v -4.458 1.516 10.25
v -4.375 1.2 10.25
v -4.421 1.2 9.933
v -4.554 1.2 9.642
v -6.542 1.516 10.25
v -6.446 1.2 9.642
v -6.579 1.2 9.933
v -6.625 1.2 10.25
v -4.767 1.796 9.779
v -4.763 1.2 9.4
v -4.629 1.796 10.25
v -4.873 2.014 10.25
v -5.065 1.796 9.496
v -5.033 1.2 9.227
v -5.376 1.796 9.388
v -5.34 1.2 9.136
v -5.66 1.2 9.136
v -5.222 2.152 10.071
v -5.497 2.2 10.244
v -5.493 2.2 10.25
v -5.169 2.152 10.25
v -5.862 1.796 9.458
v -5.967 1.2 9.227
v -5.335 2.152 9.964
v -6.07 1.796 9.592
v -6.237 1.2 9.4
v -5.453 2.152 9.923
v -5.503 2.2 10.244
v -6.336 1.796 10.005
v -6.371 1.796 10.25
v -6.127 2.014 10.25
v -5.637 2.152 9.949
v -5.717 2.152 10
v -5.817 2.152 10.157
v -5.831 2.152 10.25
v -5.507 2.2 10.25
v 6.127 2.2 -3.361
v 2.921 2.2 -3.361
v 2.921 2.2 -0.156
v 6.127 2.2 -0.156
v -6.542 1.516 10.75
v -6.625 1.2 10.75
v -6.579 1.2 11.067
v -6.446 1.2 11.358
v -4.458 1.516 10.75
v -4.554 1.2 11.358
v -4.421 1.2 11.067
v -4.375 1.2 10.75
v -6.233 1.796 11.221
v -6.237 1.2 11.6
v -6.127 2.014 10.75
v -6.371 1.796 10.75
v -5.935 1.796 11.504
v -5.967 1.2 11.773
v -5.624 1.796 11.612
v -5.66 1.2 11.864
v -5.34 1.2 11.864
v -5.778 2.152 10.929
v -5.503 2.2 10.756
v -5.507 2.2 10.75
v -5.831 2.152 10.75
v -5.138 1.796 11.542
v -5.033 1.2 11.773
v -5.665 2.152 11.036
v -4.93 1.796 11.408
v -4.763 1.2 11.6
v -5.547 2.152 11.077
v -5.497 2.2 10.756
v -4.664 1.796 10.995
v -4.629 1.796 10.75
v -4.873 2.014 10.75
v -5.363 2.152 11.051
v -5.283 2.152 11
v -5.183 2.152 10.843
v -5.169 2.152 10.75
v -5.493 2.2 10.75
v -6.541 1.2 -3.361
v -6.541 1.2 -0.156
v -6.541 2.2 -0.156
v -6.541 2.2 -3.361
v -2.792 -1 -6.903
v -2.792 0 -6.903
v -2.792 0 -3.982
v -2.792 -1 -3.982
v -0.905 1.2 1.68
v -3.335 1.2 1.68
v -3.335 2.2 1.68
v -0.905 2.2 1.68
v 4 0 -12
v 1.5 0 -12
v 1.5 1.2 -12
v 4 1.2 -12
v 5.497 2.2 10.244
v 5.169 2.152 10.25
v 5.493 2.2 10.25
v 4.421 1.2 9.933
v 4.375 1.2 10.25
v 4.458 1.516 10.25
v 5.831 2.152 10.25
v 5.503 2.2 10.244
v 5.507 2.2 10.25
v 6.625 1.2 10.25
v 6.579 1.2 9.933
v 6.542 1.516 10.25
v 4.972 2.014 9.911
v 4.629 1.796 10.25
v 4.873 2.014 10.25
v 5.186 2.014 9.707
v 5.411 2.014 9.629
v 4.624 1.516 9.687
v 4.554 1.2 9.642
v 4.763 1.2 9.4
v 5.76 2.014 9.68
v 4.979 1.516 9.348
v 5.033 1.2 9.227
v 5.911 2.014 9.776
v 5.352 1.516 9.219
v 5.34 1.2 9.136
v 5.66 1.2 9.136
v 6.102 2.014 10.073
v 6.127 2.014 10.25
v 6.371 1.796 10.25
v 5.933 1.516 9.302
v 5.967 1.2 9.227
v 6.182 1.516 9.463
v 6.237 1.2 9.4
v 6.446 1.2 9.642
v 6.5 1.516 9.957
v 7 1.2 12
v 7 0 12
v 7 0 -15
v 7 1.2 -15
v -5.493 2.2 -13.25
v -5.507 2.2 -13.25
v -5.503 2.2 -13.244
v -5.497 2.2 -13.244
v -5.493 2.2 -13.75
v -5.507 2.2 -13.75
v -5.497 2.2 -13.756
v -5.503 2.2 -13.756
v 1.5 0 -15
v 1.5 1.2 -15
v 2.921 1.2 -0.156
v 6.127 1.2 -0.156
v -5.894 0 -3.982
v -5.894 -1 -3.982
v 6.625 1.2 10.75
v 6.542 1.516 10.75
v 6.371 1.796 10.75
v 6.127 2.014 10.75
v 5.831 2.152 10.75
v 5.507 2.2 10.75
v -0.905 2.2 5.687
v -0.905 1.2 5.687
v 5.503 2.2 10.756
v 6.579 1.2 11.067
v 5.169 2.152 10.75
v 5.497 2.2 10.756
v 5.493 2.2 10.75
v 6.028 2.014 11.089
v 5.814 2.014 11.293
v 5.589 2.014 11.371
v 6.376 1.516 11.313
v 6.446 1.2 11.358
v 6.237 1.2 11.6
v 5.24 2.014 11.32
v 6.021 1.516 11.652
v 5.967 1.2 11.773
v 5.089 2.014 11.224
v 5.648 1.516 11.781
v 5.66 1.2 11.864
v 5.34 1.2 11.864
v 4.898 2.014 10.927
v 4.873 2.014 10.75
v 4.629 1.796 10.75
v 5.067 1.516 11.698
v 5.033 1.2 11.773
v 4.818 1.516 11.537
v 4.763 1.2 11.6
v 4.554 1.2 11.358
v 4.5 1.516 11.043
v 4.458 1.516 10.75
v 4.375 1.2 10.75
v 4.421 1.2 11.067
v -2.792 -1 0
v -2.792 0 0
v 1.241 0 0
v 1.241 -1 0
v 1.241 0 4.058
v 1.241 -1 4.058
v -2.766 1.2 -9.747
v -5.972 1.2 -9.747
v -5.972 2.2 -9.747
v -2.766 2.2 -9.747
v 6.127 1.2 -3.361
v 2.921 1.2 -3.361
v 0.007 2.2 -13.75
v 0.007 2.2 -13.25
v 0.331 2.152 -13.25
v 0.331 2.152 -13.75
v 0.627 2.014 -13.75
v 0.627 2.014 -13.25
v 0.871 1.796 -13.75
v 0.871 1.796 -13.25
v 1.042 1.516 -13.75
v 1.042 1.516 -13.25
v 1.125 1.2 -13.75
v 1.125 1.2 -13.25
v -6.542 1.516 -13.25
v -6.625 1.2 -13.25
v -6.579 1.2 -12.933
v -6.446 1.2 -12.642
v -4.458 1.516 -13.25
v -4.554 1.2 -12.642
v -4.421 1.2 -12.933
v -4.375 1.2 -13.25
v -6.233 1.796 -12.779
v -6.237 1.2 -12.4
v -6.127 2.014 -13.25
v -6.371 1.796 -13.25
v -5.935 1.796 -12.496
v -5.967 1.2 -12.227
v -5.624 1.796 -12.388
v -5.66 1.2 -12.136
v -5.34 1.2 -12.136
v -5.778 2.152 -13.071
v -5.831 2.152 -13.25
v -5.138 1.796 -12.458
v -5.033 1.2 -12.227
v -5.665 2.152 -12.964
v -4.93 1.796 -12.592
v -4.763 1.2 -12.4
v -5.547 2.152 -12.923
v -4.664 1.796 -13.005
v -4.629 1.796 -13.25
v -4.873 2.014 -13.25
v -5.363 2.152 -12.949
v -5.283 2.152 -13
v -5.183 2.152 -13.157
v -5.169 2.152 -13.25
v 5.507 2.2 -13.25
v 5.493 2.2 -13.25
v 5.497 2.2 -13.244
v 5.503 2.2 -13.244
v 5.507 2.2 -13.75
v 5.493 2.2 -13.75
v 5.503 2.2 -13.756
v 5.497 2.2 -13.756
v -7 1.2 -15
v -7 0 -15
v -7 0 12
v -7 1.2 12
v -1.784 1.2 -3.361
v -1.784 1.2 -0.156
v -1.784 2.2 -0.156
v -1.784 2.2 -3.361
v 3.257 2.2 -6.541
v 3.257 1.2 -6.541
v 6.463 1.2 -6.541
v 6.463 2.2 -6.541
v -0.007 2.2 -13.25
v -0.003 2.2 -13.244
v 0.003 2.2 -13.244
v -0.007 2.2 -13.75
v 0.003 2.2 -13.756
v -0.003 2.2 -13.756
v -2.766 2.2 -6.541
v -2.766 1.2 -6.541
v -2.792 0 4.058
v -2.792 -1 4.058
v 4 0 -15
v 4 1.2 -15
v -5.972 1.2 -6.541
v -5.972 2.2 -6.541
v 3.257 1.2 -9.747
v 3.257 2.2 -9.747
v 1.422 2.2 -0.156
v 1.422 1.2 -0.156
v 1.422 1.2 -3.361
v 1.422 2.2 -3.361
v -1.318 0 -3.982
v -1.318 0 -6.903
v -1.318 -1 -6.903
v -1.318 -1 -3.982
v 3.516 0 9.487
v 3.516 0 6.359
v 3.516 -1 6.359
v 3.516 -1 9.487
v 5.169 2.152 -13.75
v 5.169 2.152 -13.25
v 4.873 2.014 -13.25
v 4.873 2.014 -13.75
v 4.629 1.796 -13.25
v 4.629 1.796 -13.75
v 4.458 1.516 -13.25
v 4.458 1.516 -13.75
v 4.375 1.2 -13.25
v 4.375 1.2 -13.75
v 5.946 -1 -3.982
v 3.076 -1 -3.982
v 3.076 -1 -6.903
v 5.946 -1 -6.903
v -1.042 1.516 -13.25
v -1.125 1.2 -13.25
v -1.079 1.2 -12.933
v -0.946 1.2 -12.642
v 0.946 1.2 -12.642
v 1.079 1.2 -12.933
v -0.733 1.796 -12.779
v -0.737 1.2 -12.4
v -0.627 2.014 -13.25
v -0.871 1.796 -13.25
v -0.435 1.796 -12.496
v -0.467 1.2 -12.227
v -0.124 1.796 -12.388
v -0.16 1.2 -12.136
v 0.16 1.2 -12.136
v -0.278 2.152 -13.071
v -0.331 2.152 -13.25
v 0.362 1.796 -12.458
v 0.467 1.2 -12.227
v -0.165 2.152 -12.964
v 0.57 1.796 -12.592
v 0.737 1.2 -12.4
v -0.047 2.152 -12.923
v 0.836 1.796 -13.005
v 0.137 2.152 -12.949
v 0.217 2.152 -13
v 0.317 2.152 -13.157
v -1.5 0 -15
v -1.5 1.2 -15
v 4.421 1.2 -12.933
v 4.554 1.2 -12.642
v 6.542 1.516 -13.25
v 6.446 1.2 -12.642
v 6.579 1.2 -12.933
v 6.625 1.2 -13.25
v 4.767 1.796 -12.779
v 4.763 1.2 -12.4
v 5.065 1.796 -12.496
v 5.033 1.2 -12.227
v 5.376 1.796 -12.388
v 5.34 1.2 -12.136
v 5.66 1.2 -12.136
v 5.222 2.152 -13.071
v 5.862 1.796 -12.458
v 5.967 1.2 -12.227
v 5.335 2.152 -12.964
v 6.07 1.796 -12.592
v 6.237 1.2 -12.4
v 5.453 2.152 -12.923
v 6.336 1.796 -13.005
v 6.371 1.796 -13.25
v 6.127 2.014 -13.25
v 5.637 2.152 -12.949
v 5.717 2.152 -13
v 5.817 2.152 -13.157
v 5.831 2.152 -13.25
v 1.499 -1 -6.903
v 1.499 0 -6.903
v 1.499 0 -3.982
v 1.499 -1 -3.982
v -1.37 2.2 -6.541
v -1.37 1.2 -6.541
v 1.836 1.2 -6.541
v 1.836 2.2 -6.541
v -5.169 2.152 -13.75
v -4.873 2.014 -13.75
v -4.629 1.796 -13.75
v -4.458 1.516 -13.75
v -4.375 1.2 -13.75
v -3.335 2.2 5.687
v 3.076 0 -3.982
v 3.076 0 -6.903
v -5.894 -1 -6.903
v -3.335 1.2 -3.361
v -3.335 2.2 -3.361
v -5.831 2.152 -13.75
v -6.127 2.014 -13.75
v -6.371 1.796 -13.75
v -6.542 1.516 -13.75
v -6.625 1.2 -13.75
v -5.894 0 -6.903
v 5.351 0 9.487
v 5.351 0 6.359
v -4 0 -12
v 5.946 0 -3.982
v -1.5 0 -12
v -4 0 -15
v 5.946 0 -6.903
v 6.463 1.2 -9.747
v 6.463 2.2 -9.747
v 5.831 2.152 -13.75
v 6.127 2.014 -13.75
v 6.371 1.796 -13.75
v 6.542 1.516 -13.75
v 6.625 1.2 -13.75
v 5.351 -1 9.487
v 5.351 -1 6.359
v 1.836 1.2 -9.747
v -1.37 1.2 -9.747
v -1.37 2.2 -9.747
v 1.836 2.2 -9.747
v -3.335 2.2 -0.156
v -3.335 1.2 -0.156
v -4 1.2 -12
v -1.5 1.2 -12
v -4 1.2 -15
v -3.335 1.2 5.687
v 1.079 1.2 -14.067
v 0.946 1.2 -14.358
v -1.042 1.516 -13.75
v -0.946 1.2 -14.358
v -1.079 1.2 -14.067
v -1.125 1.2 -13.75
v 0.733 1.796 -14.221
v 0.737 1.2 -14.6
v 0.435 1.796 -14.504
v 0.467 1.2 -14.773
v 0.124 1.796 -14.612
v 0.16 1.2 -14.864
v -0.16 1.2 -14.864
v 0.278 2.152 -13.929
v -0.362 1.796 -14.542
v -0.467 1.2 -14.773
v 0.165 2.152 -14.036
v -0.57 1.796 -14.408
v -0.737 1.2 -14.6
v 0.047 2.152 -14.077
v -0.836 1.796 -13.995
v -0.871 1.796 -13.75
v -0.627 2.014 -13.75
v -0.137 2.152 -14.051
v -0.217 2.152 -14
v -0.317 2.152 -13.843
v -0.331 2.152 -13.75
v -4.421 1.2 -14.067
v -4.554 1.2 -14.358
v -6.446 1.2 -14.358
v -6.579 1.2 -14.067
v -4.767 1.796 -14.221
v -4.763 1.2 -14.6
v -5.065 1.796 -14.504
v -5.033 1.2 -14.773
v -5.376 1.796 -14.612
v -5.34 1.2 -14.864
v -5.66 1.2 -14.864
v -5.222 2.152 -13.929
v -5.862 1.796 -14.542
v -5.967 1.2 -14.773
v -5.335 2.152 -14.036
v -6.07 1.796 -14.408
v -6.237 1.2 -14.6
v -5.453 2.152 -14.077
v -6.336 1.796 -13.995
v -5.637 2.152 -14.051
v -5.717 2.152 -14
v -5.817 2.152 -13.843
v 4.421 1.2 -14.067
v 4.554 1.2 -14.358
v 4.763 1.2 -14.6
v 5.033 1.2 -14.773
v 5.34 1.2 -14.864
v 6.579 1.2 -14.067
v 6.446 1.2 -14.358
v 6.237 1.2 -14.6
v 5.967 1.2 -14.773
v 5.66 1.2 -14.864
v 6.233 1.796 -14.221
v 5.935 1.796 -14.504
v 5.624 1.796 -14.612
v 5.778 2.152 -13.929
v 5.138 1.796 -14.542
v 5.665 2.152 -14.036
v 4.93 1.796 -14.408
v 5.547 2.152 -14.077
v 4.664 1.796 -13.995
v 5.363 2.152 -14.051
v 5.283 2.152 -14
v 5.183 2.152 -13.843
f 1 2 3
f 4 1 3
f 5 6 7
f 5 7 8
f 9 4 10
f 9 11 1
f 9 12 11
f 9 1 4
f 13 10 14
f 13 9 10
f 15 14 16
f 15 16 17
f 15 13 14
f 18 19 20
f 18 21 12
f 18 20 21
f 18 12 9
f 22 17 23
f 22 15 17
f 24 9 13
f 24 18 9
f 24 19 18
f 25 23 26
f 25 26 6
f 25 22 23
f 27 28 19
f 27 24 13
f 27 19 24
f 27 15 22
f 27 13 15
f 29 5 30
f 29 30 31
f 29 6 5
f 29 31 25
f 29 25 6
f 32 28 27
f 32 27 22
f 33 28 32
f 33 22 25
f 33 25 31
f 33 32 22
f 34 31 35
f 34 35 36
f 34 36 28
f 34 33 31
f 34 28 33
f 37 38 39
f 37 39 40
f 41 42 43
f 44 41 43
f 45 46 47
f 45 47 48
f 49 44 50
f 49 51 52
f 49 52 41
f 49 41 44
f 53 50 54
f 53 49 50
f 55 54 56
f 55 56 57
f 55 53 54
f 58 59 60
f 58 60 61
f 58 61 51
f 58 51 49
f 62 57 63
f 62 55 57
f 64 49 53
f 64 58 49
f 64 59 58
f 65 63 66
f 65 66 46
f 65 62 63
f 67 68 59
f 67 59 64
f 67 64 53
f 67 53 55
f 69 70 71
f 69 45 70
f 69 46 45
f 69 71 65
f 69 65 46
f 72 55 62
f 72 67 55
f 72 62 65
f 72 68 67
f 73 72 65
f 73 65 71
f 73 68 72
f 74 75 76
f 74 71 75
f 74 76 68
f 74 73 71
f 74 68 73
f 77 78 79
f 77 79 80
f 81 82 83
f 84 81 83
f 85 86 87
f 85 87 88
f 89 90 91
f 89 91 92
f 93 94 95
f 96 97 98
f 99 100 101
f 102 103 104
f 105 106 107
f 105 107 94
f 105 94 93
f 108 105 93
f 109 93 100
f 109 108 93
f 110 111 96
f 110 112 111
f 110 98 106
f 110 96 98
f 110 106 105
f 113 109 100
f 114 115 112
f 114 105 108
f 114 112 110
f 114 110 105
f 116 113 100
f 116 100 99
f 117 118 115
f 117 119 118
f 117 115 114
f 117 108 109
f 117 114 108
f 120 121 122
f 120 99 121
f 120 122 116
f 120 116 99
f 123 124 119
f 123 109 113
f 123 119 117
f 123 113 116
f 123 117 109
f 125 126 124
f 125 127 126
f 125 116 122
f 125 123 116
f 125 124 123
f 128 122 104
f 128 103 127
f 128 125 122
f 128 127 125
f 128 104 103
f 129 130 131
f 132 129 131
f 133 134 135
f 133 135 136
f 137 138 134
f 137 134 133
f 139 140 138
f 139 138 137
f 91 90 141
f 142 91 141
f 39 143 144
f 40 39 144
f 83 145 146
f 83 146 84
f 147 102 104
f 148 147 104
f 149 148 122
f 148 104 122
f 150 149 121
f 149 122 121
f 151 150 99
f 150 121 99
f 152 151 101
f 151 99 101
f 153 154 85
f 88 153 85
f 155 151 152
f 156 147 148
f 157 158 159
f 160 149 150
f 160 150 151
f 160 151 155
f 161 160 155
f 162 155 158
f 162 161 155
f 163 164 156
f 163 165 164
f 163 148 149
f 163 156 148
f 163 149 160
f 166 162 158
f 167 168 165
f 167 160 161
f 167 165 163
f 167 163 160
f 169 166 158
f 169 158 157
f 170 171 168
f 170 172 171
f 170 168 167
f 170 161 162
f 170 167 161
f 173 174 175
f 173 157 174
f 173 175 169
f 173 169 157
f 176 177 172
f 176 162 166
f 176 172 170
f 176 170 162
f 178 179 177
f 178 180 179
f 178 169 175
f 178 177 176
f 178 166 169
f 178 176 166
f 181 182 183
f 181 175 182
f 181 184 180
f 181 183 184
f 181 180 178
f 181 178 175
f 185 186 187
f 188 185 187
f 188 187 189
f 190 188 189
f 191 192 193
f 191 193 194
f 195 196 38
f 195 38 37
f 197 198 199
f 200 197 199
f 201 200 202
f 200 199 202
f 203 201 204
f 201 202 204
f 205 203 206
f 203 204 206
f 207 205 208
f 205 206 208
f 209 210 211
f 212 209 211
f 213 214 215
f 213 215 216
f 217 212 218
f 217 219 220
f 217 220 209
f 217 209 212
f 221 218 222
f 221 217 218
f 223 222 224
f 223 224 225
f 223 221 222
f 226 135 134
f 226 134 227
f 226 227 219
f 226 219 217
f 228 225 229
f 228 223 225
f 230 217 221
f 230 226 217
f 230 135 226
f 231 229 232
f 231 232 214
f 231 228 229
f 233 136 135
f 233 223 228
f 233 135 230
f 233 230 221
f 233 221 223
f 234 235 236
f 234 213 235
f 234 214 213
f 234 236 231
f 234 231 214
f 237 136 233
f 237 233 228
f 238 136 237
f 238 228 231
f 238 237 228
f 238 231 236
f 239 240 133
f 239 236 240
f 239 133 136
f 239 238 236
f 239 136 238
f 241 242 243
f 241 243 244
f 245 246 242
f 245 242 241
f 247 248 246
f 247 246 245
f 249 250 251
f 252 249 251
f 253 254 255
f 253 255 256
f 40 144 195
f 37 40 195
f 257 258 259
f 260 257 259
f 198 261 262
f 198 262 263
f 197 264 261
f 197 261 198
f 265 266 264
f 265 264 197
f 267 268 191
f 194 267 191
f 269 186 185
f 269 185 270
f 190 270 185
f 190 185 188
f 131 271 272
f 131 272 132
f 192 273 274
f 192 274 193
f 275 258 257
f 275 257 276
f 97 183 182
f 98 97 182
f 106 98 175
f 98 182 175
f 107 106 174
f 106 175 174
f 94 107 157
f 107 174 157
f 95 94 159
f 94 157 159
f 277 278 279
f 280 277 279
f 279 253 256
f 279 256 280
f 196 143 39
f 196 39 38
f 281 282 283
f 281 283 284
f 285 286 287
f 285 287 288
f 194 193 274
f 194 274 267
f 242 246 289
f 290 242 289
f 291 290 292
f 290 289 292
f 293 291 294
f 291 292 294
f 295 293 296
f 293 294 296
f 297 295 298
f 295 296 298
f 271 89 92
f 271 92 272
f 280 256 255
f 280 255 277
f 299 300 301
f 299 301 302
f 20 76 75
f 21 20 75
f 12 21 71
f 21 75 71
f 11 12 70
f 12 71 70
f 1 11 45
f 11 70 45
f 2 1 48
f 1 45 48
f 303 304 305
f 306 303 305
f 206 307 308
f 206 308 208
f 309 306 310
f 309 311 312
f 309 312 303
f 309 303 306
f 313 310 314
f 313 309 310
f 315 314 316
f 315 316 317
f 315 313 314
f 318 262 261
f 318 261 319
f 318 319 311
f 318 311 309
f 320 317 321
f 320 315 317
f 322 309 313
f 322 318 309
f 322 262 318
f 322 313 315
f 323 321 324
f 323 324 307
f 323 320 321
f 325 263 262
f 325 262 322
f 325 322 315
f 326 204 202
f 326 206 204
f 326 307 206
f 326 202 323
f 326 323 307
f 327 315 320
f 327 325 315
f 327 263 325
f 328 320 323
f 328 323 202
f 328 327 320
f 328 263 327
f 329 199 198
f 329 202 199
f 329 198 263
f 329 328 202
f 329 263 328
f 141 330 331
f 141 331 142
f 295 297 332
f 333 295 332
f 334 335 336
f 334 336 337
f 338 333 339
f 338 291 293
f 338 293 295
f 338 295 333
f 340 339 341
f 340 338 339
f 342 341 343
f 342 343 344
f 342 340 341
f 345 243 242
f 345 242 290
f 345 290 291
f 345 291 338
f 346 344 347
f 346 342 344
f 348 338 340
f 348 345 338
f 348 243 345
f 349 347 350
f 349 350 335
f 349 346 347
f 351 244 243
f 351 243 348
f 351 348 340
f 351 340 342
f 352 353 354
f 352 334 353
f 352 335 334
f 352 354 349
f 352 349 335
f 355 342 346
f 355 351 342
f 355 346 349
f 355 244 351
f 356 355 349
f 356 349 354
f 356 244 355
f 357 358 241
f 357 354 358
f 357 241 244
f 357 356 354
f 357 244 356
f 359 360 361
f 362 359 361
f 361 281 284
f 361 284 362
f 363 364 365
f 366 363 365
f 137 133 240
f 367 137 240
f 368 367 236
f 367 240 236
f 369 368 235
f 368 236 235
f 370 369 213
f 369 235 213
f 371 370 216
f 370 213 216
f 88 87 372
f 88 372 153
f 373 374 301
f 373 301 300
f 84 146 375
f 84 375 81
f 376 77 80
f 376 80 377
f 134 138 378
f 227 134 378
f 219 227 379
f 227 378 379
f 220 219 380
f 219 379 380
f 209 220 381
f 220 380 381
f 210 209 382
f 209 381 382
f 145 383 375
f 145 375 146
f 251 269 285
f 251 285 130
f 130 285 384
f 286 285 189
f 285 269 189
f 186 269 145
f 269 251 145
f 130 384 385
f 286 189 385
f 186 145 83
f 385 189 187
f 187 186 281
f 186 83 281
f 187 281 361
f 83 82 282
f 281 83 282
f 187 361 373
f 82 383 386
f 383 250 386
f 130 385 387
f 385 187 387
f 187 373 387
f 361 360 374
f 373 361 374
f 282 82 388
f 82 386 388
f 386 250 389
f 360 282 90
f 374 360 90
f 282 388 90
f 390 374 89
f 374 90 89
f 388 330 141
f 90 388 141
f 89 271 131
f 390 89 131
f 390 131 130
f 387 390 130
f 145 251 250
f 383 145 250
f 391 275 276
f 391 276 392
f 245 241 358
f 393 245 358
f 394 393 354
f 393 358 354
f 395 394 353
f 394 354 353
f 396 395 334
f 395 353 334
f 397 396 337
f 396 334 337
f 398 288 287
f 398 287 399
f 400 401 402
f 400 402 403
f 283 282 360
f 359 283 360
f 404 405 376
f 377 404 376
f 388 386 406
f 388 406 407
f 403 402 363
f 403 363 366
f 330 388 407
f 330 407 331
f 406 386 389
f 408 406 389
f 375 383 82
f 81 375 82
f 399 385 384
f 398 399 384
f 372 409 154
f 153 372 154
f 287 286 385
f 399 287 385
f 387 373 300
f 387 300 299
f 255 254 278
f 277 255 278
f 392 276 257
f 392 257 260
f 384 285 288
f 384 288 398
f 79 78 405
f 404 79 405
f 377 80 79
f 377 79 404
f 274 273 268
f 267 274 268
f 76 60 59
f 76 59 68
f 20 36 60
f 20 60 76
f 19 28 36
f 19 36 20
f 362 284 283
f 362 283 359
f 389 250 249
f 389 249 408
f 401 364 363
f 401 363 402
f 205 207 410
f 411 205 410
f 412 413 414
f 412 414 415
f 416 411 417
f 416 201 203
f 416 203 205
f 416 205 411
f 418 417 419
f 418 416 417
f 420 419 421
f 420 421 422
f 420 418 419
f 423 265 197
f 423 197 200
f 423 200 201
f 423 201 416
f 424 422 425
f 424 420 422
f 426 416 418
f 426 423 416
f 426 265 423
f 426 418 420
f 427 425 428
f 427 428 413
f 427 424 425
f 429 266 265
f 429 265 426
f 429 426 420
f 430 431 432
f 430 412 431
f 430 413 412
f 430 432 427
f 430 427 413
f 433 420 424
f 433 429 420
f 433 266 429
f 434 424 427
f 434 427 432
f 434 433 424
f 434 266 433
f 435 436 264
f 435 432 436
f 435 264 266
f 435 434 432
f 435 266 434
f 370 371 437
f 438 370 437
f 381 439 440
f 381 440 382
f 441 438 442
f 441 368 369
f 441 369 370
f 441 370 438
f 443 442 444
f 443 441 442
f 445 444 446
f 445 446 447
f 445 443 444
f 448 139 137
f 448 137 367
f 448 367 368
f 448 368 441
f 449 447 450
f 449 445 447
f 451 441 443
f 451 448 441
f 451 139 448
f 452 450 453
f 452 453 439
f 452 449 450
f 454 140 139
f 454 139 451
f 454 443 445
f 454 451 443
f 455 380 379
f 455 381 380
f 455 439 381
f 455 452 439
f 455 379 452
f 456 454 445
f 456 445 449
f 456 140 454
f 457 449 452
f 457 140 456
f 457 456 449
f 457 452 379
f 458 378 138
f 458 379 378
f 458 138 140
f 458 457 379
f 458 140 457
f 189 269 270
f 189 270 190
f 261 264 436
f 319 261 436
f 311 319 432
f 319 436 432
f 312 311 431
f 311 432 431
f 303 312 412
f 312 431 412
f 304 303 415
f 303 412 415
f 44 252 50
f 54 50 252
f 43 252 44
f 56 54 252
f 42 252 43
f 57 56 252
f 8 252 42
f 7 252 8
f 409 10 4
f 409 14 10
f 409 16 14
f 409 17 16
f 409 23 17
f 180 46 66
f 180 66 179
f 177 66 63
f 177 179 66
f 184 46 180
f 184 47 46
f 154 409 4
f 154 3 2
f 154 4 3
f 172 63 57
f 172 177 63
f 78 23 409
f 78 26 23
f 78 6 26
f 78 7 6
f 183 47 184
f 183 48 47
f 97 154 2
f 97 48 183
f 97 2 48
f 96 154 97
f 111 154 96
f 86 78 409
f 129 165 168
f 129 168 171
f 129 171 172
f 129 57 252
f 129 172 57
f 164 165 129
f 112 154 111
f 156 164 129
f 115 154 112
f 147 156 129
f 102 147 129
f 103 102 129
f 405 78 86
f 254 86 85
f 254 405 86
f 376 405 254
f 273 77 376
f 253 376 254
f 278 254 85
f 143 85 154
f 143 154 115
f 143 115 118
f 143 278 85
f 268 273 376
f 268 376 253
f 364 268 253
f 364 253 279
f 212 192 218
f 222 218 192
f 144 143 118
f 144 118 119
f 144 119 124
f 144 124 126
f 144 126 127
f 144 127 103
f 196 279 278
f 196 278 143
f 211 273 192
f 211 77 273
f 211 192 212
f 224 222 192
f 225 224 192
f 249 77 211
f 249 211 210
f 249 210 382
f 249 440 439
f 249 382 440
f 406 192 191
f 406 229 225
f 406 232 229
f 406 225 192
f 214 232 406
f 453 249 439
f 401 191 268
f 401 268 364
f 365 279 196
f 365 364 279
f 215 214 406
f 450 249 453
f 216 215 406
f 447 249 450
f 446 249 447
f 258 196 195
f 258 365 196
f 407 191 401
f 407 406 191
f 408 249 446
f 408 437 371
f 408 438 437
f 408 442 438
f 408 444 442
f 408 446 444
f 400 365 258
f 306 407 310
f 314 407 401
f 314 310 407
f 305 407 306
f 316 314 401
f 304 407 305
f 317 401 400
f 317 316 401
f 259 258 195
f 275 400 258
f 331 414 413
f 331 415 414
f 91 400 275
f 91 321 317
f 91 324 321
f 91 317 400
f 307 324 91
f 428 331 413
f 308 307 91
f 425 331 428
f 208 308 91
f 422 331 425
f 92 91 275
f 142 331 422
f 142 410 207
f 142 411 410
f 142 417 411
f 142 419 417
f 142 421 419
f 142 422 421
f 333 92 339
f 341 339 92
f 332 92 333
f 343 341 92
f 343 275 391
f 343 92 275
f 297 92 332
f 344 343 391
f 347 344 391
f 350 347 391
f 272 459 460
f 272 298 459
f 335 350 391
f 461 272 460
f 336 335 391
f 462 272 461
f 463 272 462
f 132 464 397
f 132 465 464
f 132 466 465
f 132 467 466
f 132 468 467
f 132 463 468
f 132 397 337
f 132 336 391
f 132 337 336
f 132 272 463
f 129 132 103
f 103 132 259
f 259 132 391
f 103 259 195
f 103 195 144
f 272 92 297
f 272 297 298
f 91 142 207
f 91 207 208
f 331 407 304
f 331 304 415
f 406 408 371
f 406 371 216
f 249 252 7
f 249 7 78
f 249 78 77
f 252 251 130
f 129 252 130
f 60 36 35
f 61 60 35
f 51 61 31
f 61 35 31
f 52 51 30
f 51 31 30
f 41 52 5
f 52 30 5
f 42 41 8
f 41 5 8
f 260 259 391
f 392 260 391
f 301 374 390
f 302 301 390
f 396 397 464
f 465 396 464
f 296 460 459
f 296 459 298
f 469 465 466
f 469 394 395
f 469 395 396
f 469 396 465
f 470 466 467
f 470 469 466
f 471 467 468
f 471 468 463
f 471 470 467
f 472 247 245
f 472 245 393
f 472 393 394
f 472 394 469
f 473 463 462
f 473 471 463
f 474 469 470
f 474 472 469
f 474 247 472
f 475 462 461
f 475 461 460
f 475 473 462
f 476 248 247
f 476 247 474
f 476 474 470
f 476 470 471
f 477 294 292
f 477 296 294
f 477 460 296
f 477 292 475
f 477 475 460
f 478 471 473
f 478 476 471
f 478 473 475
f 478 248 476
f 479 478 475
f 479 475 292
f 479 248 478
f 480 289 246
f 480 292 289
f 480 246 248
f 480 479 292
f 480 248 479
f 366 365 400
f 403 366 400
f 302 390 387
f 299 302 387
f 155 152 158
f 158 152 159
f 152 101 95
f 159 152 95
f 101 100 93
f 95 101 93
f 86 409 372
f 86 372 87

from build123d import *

# Parameters (mm, degrees)
SKETCH1_W               = 14
SKETCH1_H               = 24
SKETCH1_W_2             = 3
SKETCH1_H_2             = 3
PCB_DEPTH               = 1.2
SOLDER_JOINTS_DEPTH     = 1
SOLDER_FILLETS_R        = 1.125
SKETCH2_W               = 3.205722041
SKETCH2_H               = 3.205722042
SKETCH2_W_2             = 3.205722042
SKETCH2_W_3             = 2.430144128
SKETCH2_H_2             = 4.007152552
TOP_COMPONENTS_DEPTH    = 1
SKETCH3_W               = 4.033005149
SKETCH3_H               = 4.058308378
SKETCH3_W_2             = 3.102311653
SKETCH3_H_2             = 2.921343474
SKETCH3_W_3             = 2.817933085
SKETCH3_W_4             = 2.869638279
SKETCH3_W_5             = 1.835534395
SKETCH3_H_3             = 3.12816425
BOTTOM_COMPONENTS_DEPTH = 1


with BuildPart() as part:
    # Sketch1 → PCB (new body)
    with BuildSketch(Plane(origin=(0, 0, 0), x_dir=(1, 0, 0), z_dir=(0, 1, 0))):
        Rectangle(SKETCH1_W, SKETCH1_H)
        with Locations((-5.5, 13.5)):
            Rectangle(SKETCH1_W_2, SKETCH1_H_2)
        with Locations((0, 13.5)):
            Rectangle(SKETCH1_W_2, SKETCH1_H_2)
        with Locations((5.5, 13.5)):
            Rectangle(SKETCH1_W_2, SKETCH1_H_2)
    extrude(amount=PCB_DEPTH)

    # Sketch5 → Solder joints (add)
    with BuildSketch(Plane(origin=(0, 1.2, 0), x_dir=(1, 0, 0), z_dir=(0, 1, 0))):
        with BuildLine():
            Line((-4.375, 13.25), (-4.375, 13.75))
            ThreePointArc((-4.375, 13.75), (-5.5, 14.875), (-6.625, 13.75))
            Line((-6.625, 13.75), (-6.625, 13.25))
            ThreePointArc((-6.625, 13.25), (-5.5, 12.125), (-4.375, 13.25))
        make_face()
        with BuildLine():
            Line((-1.125, 13.75), (-1.125, 13.25))
            ThreePointArc((-1.125, 13.25), (0, 12.125), (1.125, 13.25))
            Line((1.125, 13.25), (1.125, 13.75))
            ThreePointArc((1.125, 13.75), (0, 14.875), (-1.125, 13.75))
        make_face()
        with BuildLine():
            Line((4.375, 13.75), (4.375, 13.25))
            ThreePointArc((4.375, 13.25), (5.5, 12.125), (6.625, 13.25))
            Line((6.625, 13.25), (6.625, 13.75))
            ThreePointArc((6.625, 13.75), (5.5, 14.875), (4.375, 13.75))
        make_face()
        with BuildLine():
            Line((-6.625, -10.25), (-6.625, -10.75))
            ThreePointArc((-6.625, -10.75), (-5.5, -11.875), (-4.375, -10.75))
            Line((-4.375, -10.75), (-4.375, -10.25))
            ThreePointArc((-4.375, -10.25), (-5.5, -9.125), (-6.625, -10.25))
        make_face()
        with BuildLine():
            ThreePointArc((6.625, -10.75), (5.5, -11.875), (4.375, -10.75))
            Line((4.375, -10.75), (4.375, -10.25))
            ThreePointArc((4.375, -10.25), (5.5, -9.125), (6.625, -10.25))
            Line((6.625, -10.25), (6.625, -10.75))
        make_face()
    extrude(amount=SOLDER_JOINTS_DEPTH)

    # Solder fillets
    # the kernel refuses this fillet: 1.125 mm, written as the material it takes off along each edge
    with BuildSketch(Plane(origin=(-5.5, 2.2, 10.25), x_dir=(1, 0, 0), z_dir=(0, 0, 1))) as solder_fillets_piece_1:
        with BuildLine():
            CenterArc((0.006966011, -1.125), SOLDER_FILLETS_R, 6.379370208, 83.620629792)
            Line((0.006966011, 0), (0.006966011, 0.0225))
            Line((0.006966011, 0.0225), (1.125, 0.0225))
            Line((1.125, 0.0225), (1.1475, 0))
            ThreePointArc((1.1475, 0), (1.1475, -0.5), (1.14736068, -0.9975))
            Line((1.14736068, -0.9975), (1.125, -1))
        make_face()
    revolve(axis=Axis((-5.5, 2.2, 10.25), (0, 1, 0)), revolution_arc=180, mode=Mode.SUBTRACT)
    with BuildSketch(Plane(origin=(-4.375, 2.2, 10.75), x_dir=(0, -1, 0), z_dir=(0, 0, -1)), Plane(origin=(-6.625, 2.2, 10.25), x_dir=(0, -1, 0), z_dir=(0, 0, 1)), Plane(origin=(6.625, 2.2, -13.25), x_dir=(0, -1, 0), z_dir=(0, 0, -1)), Plane(origin=(4.375, 2.2, -13.75), x_dir=(0, -1, 0), z_dir=(0, 0, 1)), Plane(origin=(1.125, 2.2, -13.25), x_dir=(0, -1, 0), z_dir=(0, 0, -1)), Plane(origin=(-1.125, 2.2, -13.75), x_dir=(0, -1, 0), z_dir=(0, 0, 1)), Plane(origin=(-6.625, 2.2, -13.75), x_dir=(0, -1, 0), z_dir=(0, 0, 1)), Plane(origin=(-4.375, 2.2, -13.25), x_dir=(0, -1, 0), z_dir=(0, 0, -1))) as solder_fillets_piece_2:
        with BuildLine():
            CenterArc((1.125, 1.118033989), SOLDER_FILLETS_R, 180, 83.620629792)
            Line((0, 1.118033989), (-0.0225, 1.118033989))
            Line((-0.0225, 1.118033989), (-0.0225, 0))
            Line((-0.0225, 0), (0, -0.0225))
            ThreePointArc((0, -0.0225), (0.5, -0.0225), (0.9975, -0.02236068))
            Line((0.9975, -0.02236068), (1, 0))
        make_face()
    extrude(amount=0.5, mode=Mode.SUBTRACT)
    with BuildSketch(Plane(origin=(-5.5, 2.2, 10.75), x_dir=(-1, 0, 0), z_dir=(0, 0, -1))) as solder_fillets_piece_3:
        with BuildLine():
            CenterArc((0.006966011, -1.125), SOLDER_FILLETS_R, 6.379370208, 83.620629792)
            Line((0.006966011, 0), (0.006966011, 0.0225))
            Line((0.006966011, 0.0225), (1.125, 0.0225))
            Line((1.125, 0.0225), (1.1475, 0))
            ThreePointArc((1.1475, 0), (1.1475, -0.5), (1.14736068, -0.9975))
            Line((1.14736068, -0.9975), (1.125, -1))
        make_face()
    revolve(axis=Axis((-5.5, 2.2, 10.75), (0, 1, 0)), revolution_arc=180, mode=Mode.SUBTRACT)
    with BuildSketch(Plane(origin=(4.375, 2.2, 10.75), x_dir=(0, -1, 0), z_dir=(0, 0, -1)), Plane(origin=(6.625, 2.2, 10.25), x_dir=(0, -1, 0), z_dir=(0, 0, 1))) as solder_fillets_piece_4:
        with BuildLine():
            CenterArc((1.125, -1.118033989), SOLDER_FILLETS_R, 96.379370208, 83.620629792)
            Line((0, -1.118033989), (-0.0225, -1.118033989))
            Line((-0.0225, -1.118033989), (-0.0225, 0))
            Line((-0.0225, 0), (0, 0.0225))
            ThreePointArc((0, 0.0225), (0.5, 0.0225), (0.9975, 0.02236068))
            Line((0.9975, 0.02236068), (1, 0))
        make_face()
    extrude(amount=0.5, mode=Mode.SUBTRACT)
    with BuildSketch(Plane(origin=(5.5, 2.2, 10.25), x_dir=(-1, 0, 0), z_dir=(0, 0, 1))) as solder_fillets_piece_5:
        with BuildLine():
            CenterArc((0.006966011, 1.125), SOLDER_FILLETS_R, 270, 83.620629792)
            Line((0.006966011, 0), (0.006966011, -0.0225))
            Line((0.006966011, -0.0225), (1.125, -0.0225))
            Line((1.125, -0.0225), (1.1475, 0))
            ThreePointArc((1.1475, 0), (1.1475, 0.5), (1.14736068, 0.9975))
            Line((1.14736068, 0.9975), (1.125, 1))
        make_face()
    revolve(axis=Axis((5.5, 2.2, 10.25), (0, -1, 0)), revolution_arc=180, mode=Mode.SUBTRACT)
    with BuildSketch(Plane(origin=(5.5, 2.2, 10.75), x_dir=(1, 0, 0), z_dir=(0, 0, -1))) as solder_fillets_piece_6:
        with BuildLine():
            CenterArc((0.006966011, 1.125), SOLDER_FILLETS_R, 270, 83.620629792)
            Line((0.006966011, 0), (0.006966011, -0.0225))
            Line((0.006966011, -0.0225), (1.125, -0.0225))
            Line((1.125, -0.0225), (1.1475, 0))
            ThreePointArc((1.1475, 0), (1.1475, 0.5), (1.14736068, 0.9975))
            Line((1.14736068, 0.9975), (1.125, 1))
        make_face()
    revolve(axis=Axis((5.5, 2.2, 10.75), (0, -1, 0)), revolution_arc=180, mode=Mode.SUBTRACT)
    with BuildSketch(Plane(origin=(5.5, 2.2, -13.75), x_dir=(1, 0, 0), z_dir=(0, 0, 1))) as solder_fillets_piece_7:
        with BuildLine():
            CenterArc((0.006966011, -1.125), SOLDER_FILLETS_R, 6.379370208, 83.620629792)
            Line((0.006966011, 0), (0.006966011, 0.0225))
            Line((0.006966011, 0.0225), (1.125, 0.0225))
            Line((1.125, 0.0225), (1.1475, 0))
            ThreePointArc((1.1475, 0), (1.1475, -0.5), (1.14736068, -0.9975))
            Line((1.14736068, -0.9975), (1.125, -1))
        make_face()
    revolve(axis=Axis((5.5, 2.2, -13.75), (0, 1, 0)), revolution_arc=180, mode=Mode.SUBTRACT)
    with BuildSketch(Plane(origin=(5.5, 2.2, -13.25), x_dir=(-1, 0, 0), z_dir=(0, 0, -1))) as solder_fillets_piece_8:
        with BuildLine():
            CenterArc((0.006966011, -1.125), SOLDER_FILLETS_R, 6.379370208, 83.620629792)
            Line((0.006966011, 0), (0.006966011, 0.0225))
            Line((0.006966011, 0.0225), (1.125, 0.0225))
            Line((1.125, 0.0225), (1.1475, 0))
            ThreePointArc((1.1475, 0), (1.1475, -0.5), (1.14736068, -0.9975))
            Line((1.14736068, -0.9975), (1.125, -1))
        make_face()
    revolve(axis=Axis((5.5, 2.2, -13.25), (0, 1, 0)), revolution_arc=180, mode=Mode.SUBTRACT)
    with BuildSketch(Plane(origin=(0, 2.2, -13.75), x_dir=(1, 0, 0), z_dir=(0, 0, 1))) as solder_fillets_piece_9:
        with BuildLine():
            CenterArc((0.006966011, -1.125), SOLDER_FILLETS_R, 6.379370208, 83.620629792)
            Line((0.006966011, 0), (0.006966011, 0.0225))
            Line((0.006966011, 0.0225), (1.125, 0.0225))
            Line((1.125, 0.0225), (1.1475, 0))
            ThreePointArc((1.1475, 0), (1.1475, -0.5), (1.14736068, -0.9975))
            Line((1.14736068, -0.9975), (1.125, -1))
        make_face()
    revolve(axis=Axis((0, 2.2, -13.75), (0, 1, 0)), revolution_arc=180, mode=Mode.SUBTRACT)
    with BuildSketch(Plane(origin=(0, 2.2, -13.25), x_dir=(-1, 0, 0), z_dir=(0, 0, -1))) as solder_fillets_piece_10:
        with BuildLine():
            CenterArc((0.006966011, -1.125), SOLDER_FILLETS_R, 6.379370208, 83.620629792)
            Line((0.006966011, 0), (0.006966011, 0.0225))
            Line((0.006966011, 0.0225), (1.125, 0.0225))
            Line((1.125, 0.0225), (1.1475, 0))
            ThreePointArc((1.1475, 0), (1.1475, -0.5), (1.14736068, -0.9975))
            Line((1.14736068, -0.9975), (1.125, -1))
        make_face()
    revolve(axis=Axis((0, 2.2, -13.25), (0, 1, 0)), revolution_arc=180, mode=Mode.SUBTRACT)
    with BuildSketch(Plane(origin=(-5.5, 2.2, -13.25), x_dir=(-1, 0, 0), z_dir=(0, 0, -1))) as solder_fillets_piece_11:
        with BuildLine():
            CenterArc((0.006966011, -1.125), SOLDER_FILLETS_R, 6.379370208, 83.620629792)
            Line((0.006966011, 0), (0.006966011, 0.0225))
            Line((0.006966011, 0.0225), (1.125, 0.0225))
            Line((1.125, 0.0225), (1.1475, 0))
            ThreePointArc((1.1475, 0), (1.1475, -0.5), (1.14736068, -0.9975))
            Line((1.14736068, -0.9975), (1.125, -1))
        make_face()
    revolve(axis=Axis((-5.5, 2.2, -13.25), (0, 1, 0)), revolution_arc=180, mode=Mode.SUBTRACT)
    with BuildSketch(Plane(origin=(-5.5, 2.2, -13.75), x_dir=(1, 0, 0), z_dir=(0, 0, 1))) as solder_fillets_piece_12:
        with BuildLine():
            CenterArc((0.006966011, -1.125), SOLDER_FILLETS_R, 6.379370208, 83.620629792)
            Line((0.006966011, 0), (0.006966011, 0.0225))
            Line((0.006966011, 0.0225), (1.125, 0.0225))
            Line((1.125, 0.0225), (1.1475, 0))
            ThreePointArc((1.1475, 0), (1.1475, -0.5), (1.14736068, -0.9975))
            Line((1.14736068, -0.9975), (1.125, -1))
        make_face()
    revolve(axis=Axis((-5.5, 2.2, -13.75), (0, 1, 0)), revolution_arc=180, mode=Mode.SUBTRACT)

    # Sketch2 → Top components (add)
    with BuildSketch(Plane(origin=(0, 1.2, 0), x_dir=(1, 0, 0), z_dir=(0, 1, 0))):
        with Locations((-4.369088912, 8.144117457)):
            Rectangle(SKETCH2_W, SKETCH2_H)
        with Locations((0.232673374, 8.144117457)):
            Rectangle(SKETCH2_W_2, SKETCH2_H)
        with Locations((4.860288257, 8.144117457)):
            Rectangle(SKETCH2_W, SKETCH2_H)
        with Locations((-4.937846048, 1.758525971)):
            Rectangle(SKETCH2_W_2, SKETCH2_H)
        with Locations((-0.18096818, 1.758525971)):
            Rectangle(SKETCH2_W_2, SKETCH2_H)
        with Locations((4.524204494, 1.758525971)):
            Rectangle(SKETCH2_W_2, SKETCH2_H)
        with Locations((-2.119912963, -3.68344572)):
            Rectangle(SKETCH2_W_3, SKETCH2_H_2)
    extrude(amount=TOP_COMPONENTS_DEPTH)

    # Sketch3 → Bottom components (add)
    with BuildSketch(Plane.XZ):
        with Locations((-0.775577914, 2.029154189)):
            Rectangle(SKETCH3_W, SKETCH3_H)
        with Locations((-4.343236315, -5.442521059)):
            Rectangle(SKETCH3_W_2, SKETCH3_H_2)
        with Locations((0.090484089, -5.442521059)):
            Rectangle(SKETCH3_W_3, SKETCH3_H_2)
        with Locations((4.511278196, -5.442521059)):
            Rectangle(SKETCH3_W_4, SKETCH3_H_2)
        with Locations((4.433720405, 7.923271646)):
            Rectangle(SKETCH3_W_5, SKETCH3_H_3)
    extrude(amount=BOTTOM_COMPONENTS_DEPTH)


solid = part.part
